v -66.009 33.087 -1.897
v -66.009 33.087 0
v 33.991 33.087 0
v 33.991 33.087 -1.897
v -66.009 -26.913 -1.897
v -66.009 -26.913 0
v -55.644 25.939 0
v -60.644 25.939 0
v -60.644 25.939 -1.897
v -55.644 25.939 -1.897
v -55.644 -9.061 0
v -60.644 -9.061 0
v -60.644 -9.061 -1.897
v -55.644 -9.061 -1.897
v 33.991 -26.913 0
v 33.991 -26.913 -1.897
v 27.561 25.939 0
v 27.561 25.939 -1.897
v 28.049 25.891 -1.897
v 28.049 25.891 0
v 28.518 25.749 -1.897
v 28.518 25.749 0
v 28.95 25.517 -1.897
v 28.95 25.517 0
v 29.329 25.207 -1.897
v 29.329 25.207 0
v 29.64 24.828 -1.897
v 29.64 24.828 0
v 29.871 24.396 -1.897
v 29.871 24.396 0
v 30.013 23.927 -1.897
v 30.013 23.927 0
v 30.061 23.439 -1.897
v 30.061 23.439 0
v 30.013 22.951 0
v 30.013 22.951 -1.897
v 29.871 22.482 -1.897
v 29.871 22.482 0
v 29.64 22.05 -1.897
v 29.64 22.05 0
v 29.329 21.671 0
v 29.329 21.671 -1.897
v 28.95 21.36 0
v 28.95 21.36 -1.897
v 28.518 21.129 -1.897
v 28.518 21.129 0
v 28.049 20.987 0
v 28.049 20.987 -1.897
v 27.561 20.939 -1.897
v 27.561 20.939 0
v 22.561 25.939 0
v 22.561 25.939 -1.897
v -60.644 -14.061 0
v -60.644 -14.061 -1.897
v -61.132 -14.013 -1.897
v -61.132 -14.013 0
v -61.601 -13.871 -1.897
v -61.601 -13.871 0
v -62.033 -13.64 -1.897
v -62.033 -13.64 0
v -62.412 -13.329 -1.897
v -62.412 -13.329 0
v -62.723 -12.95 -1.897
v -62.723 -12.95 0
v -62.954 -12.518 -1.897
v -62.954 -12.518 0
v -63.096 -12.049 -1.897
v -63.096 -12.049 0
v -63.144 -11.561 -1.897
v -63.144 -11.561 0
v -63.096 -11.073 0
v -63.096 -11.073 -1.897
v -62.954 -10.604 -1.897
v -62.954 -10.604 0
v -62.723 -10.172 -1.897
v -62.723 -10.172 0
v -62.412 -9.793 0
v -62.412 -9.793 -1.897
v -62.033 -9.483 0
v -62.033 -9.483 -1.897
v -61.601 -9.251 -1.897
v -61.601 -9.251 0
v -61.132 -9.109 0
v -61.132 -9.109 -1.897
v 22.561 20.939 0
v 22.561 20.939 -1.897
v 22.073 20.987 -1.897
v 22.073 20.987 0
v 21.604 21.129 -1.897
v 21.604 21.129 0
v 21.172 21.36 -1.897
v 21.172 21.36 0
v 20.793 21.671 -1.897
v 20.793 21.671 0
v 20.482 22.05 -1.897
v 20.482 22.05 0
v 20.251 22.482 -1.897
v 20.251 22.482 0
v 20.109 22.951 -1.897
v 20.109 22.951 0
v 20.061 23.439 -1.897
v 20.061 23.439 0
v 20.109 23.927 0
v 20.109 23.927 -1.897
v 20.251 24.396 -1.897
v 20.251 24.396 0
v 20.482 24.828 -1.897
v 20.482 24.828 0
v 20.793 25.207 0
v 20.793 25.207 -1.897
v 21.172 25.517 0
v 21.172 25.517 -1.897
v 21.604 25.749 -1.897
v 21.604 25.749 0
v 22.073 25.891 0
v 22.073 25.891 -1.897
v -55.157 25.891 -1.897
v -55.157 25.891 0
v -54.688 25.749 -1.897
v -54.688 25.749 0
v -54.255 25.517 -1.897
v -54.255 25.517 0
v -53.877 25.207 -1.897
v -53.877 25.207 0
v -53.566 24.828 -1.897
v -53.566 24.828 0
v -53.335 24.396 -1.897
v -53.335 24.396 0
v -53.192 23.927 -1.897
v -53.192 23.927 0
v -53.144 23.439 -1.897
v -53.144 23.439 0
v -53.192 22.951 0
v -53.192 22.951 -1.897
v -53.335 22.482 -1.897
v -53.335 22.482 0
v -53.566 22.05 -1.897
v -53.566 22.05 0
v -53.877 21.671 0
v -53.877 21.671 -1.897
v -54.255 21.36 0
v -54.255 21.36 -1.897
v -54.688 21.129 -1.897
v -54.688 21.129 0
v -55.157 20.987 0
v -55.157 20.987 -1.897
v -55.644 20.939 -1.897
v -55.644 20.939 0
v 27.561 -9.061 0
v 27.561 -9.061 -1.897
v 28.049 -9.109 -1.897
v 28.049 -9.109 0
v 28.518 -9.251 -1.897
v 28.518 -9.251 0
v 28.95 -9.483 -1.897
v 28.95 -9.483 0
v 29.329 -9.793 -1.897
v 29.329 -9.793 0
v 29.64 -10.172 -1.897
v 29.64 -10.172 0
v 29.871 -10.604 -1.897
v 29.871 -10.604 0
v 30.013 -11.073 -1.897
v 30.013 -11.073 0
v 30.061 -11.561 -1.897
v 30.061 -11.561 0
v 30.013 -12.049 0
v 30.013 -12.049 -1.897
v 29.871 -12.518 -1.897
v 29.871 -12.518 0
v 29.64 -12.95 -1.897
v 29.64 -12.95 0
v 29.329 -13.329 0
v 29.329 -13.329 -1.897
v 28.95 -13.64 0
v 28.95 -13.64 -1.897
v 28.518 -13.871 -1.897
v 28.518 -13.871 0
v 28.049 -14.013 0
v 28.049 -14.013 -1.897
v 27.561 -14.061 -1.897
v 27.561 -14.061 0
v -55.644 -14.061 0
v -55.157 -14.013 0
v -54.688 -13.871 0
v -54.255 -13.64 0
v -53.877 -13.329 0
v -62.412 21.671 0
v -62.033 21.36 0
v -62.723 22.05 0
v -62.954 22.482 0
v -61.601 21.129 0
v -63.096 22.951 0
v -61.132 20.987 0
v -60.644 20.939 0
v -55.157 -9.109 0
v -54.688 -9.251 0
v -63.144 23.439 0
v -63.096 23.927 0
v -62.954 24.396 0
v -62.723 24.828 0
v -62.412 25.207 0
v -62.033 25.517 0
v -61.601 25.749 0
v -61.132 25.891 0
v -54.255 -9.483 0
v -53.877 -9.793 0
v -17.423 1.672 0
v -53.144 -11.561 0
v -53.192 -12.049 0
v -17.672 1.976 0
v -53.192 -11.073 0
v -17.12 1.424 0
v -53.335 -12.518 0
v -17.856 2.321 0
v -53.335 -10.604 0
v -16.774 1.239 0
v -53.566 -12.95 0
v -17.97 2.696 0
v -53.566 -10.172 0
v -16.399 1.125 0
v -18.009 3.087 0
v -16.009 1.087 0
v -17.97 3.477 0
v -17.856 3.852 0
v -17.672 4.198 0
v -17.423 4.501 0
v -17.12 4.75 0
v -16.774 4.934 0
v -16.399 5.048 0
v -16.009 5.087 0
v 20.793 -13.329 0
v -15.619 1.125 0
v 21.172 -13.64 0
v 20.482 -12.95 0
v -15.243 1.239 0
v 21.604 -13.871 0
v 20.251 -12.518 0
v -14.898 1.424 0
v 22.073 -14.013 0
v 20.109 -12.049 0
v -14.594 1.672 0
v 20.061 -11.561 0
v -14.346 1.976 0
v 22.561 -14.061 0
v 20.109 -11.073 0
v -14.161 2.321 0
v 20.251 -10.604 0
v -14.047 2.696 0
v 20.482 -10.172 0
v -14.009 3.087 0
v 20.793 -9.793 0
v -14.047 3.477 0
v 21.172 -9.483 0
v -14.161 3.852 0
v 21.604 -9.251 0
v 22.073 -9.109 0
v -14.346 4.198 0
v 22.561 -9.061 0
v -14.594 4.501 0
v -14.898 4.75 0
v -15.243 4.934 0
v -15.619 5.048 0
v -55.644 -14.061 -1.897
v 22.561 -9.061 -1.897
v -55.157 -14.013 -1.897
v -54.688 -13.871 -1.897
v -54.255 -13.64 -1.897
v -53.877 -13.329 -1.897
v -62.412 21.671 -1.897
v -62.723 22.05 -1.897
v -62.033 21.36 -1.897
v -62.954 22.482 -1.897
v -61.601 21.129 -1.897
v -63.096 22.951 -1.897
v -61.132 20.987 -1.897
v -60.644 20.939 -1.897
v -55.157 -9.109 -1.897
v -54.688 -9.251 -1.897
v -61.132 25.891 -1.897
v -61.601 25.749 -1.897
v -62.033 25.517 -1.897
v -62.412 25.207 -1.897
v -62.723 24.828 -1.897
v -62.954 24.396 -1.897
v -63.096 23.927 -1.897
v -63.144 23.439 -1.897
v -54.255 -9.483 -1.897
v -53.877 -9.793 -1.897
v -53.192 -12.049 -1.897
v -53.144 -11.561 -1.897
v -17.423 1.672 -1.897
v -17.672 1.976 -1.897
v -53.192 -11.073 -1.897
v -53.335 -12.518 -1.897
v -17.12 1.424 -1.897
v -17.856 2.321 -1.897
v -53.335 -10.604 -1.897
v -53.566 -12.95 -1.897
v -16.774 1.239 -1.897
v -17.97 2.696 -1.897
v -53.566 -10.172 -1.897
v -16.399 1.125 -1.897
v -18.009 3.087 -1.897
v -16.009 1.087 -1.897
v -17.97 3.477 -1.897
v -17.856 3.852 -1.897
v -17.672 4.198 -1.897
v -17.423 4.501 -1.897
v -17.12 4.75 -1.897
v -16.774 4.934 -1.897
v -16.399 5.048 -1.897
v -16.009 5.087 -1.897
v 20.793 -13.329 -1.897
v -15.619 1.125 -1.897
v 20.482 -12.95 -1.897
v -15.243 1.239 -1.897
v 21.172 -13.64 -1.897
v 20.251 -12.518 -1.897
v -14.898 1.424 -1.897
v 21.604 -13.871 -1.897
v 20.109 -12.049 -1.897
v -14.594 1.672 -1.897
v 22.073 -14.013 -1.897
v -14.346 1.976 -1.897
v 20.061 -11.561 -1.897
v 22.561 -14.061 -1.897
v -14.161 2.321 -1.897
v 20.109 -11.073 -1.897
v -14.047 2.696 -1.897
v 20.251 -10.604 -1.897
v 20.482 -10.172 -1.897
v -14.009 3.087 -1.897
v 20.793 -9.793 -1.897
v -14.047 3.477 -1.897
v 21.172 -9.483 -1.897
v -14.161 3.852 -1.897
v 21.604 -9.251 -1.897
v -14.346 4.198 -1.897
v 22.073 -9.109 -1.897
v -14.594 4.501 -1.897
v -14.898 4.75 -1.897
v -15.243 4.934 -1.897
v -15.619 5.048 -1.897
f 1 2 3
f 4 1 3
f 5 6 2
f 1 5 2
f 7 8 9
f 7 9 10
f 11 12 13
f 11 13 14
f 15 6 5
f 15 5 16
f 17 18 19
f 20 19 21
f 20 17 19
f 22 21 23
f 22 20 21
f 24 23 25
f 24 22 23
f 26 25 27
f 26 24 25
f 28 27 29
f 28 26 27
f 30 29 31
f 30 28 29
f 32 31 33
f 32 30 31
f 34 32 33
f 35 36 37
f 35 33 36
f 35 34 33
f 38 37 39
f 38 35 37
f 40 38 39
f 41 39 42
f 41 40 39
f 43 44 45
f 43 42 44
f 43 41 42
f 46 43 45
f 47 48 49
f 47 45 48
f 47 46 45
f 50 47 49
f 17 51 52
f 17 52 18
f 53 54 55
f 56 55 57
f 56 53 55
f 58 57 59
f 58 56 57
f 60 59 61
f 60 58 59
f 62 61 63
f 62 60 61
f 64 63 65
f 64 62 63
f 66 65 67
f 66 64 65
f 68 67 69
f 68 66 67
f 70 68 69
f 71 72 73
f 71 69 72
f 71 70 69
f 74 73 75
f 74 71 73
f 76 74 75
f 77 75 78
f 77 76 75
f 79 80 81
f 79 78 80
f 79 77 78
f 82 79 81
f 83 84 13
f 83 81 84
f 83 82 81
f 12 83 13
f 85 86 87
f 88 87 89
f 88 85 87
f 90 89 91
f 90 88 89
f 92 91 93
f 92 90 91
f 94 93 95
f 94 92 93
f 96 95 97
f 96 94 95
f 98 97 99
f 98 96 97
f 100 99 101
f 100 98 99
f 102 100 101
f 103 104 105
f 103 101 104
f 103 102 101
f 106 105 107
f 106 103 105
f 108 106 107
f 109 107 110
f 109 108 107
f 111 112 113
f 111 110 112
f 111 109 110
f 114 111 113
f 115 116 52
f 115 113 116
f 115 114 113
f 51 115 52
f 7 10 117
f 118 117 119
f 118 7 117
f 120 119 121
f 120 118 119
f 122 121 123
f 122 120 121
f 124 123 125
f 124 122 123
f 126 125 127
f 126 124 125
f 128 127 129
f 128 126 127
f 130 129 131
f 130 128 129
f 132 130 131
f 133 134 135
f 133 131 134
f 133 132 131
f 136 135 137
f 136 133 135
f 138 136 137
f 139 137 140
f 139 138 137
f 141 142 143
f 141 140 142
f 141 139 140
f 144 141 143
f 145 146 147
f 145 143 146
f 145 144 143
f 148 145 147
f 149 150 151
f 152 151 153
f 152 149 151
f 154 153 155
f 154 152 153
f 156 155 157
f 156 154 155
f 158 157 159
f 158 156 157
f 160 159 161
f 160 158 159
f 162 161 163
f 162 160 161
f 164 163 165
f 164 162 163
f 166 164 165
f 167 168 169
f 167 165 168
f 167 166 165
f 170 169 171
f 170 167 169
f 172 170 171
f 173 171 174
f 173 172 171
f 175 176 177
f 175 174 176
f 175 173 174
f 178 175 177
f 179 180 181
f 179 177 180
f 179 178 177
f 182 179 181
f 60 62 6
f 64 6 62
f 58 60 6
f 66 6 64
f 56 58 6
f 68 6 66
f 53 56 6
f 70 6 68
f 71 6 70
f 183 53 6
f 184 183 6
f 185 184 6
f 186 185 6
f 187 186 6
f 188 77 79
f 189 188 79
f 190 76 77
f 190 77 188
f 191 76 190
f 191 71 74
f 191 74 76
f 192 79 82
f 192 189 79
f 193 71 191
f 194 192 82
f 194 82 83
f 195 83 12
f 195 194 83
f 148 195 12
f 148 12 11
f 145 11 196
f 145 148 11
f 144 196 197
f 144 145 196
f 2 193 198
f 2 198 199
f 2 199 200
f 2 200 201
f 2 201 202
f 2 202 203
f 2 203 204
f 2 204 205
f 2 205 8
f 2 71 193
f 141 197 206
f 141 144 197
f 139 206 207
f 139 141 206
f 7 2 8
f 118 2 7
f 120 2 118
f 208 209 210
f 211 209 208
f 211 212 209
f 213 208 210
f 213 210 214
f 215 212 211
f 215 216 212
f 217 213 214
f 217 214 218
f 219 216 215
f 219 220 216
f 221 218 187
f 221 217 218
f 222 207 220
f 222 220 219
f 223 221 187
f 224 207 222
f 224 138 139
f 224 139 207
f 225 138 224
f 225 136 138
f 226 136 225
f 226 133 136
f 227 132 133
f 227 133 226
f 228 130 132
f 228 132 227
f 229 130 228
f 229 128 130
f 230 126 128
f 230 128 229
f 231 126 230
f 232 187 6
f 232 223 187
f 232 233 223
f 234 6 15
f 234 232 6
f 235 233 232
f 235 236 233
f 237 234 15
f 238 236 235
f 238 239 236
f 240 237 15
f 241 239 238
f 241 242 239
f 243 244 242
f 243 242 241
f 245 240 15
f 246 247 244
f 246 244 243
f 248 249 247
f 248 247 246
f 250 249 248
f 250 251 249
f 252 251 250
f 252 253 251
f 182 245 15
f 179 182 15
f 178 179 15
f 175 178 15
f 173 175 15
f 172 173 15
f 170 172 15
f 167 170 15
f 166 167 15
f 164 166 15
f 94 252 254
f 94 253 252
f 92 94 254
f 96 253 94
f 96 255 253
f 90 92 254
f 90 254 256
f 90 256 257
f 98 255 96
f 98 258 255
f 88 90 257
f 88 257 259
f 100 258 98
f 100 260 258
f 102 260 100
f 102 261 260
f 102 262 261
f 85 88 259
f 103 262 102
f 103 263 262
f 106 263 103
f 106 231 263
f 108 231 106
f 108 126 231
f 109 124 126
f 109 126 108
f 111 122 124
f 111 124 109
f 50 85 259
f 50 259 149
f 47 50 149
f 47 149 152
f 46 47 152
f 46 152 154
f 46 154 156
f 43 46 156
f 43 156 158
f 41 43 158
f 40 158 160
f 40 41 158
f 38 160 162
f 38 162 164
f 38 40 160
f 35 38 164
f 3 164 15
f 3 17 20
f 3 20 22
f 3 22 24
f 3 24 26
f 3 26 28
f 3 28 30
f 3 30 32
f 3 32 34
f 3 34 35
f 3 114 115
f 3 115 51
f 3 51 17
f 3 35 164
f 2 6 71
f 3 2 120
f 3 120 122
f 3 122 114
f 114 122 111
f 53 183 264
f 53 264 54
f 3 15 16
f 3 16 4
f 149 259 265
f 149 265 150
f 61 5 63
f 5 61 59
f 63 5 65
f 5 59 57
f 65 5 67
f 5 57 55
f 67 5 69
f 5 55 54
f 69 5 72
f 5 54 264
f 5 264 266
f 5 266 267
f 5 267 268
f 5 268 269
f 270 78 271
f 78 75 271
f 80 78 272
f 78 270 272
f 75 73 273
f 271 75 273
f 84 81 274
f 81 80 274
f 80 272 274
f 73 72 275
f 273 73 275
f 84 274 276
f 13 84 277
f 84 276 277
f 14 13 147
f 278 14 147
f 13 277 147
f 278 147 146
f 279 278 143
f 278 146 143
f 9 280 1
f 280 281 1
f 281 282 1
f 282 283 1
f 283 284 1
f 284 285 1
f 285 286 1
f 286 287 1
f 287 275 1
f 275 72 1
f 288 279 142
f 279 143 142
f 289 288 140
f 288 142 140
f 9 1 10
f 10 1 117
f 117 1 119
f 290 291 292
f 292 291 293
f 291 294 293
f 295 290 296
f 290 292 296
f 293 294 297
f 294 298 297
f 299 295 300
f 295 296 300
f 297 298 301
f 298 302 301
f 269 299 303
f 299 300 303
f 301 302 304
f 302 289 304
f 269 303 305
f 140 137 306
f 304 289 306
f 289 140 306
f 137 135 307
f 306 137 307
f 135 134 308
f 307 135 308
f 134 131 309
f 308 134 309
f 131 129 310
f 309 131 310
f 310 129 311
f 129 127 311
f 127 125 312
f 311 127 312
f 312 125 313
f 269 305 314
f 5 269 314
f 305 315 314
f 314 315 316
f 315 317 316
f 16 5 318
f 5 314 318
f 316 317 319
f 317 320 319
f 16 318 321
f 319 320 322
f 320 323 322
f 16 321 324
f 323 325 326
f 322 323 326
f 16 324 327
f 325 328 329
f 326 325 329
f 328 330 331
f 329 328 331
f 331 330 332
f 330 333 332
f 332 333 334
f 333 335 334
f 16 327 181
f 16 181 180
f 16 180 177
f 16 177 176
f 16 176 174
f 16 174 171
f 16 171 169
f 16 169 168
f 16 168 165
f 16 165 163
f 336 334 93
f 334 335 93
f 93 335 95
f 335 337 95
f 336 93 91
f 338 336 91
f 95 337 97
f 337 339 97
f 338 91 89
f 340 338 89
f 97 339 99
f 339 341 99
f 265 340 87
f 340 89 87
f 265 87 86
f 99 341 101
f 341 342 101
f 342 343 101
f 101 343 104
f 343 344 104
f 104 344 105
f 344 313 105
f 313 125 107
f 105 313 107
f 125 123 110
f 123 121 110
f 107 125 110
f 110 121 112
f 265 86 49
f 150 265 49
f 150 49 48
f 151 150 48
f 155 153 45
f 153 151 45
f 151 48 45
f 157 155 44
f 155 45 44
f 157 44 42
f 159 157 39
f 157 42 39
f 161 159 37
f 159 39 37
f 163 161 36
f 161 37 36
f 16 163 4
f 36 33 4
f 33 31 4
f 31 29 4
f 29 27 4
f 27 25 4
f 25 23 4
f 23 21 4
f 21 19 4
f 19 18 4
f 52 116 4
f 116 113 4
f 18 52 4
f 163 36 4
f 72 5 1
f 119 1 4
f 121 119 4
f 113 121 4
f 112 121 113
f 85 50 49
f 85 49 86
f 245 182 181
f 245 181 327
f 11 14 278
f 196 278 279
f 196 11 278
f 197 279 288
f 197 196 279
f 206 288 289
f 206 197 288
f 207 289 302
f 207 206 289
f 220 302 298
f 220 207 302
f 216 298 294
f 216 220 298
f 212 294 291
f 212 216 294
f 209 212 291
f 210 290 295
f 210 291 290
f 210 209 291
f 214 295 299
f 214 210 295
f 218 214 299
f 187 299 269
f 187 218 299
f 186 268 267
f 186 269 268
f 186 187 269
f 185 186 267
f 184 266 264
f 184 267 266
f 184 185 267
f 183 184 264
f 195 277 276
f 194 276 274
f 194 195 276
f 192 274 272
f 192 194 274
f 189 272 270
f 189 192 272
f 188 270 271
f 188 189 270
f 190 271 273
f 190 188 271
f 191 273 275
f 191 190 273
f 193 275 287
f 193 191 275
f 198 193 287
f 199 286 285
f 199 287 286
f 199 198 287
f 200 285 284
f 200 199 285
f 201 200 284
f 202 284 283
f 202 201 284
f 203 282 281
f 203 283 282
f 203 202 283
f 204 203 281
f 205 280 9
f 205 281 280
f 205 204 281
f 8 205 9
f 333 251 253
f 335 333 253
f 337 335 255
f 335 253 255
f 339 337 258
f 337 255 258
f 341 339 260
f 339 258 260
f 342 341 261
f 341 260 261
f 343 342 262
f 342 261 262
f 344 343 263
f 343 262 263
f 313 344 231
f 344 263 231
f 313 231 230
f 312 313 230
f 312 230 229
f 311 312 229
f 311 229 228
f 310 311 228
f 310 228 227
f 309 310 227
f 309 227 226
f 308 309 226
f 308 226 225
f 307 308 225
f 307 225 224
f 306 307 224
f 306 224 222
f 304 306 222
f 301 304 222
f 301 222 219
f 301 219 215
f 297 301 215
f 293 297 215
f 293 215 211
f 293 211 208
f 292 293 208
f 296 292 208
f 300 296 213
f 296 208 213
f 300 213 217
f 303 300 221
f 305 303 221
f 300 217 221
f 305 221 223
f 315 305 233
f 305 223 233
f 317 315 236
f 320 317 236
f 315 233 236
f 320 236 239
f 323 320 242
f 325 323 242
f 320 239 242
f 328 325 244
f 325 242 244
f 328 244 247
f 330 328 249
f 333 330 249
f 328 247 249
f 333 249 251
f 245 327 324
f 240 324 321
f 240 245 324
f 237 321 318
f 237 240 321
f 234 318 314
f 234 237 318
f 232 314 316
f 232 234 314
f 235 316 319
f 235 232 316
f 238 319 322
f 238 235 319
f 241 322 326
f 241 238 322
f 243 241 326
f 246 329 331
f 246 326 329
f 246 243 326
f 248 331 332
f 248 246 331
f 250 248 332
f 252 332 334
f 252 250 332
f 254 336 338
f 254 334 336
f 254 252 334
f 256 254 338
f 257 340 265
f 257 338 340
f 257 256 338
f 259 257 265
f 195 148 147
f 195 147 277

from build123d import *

# Parameters (mm, degrees)
SKETCH1_W          = 100
SKETCH1_H          = 60
BASE_FLANGE1_DEPTH = 1.89738
SKETCH7_R          = 2
CUT_EXTRUDE2_DEPTH = 2


# Sheet-metal steps are written as plain solids
with BuildPart() as part:
    # Sketch1 → Base-Flange1 (new body)
    with BuildSketch(Plane.XY):
        with Locations((-16.008698092, 3.086666862)):
            Rectangle(SKETCH1_W, SKETCH1_H)
    extrude(amount=-BASE_FLANGE1_DEPTH)

    # Sketch7 → Cut-Extrude2 (cut)
    with BuildSketch(Plane.XY):
        with Locations((-16.008698092, 3.086666862)):
            Circle(SKETCH7_R)
        with BuildLine():
            Line((-60.644357263, -9.061184979), (-55.644357263, -9.061184979))
            ThreePointArc((-55.644357263, -9.061184979), (-53.144357263, -11.561184979), (-55.644357263, -14.061184979))
            Line((-55.644357263, -14.061184979), (-60.644357263, -14.061184979))
            ThreePointArc((-60.644357263, -14.061184979), (-63.144357263, -11.561184979), (-60.644357263, -9.061184979))
        make_face()
        with BuildLine():
            Line((-60.644357263, 25.938815021), (-55.644357263, 25.938815021))
            ThreePointArc((-55.644357263, 25.938815021), (-53.144357263, 23.438815021), (-55.644357263, 20.938815021))
            Line((-55.644357263, 20.938815021), (-60.644357263, 20.938815021))
            ThreePointArc((-60.644357263, 20.938815021), (-63.144357263, 23.438815021), (-60.644357263, 25.938815021))
        make_face()
        with BuildLine():
            Line((27.560882737, 20.938815021), (22.560882737, 20.938815021))
            ThreePointArc((22.560882737, 20.938815021), (20.060882737, 23.438815021), (22.560882737, 25.938815021))
            Line((22.560882737, 25.938815021), (27.560882737, 25.938815021))
            ThreePointArc((27.560882737, 25.938815021), (30.060882737, 23.438815021), (27.560882737, 20.938815021))
        make_face()
        with BuildLine():
            Line((27.560882737, -14.061184979), (22.560882737, -14.061184979))
            ThreePointArc((22.560882737, -14.061184979), (20.060882737, -11.561184979), (22.560882737, -9.061184979))
            Line((22.560882737, -9.061184979), (27.560882737, -9.061184979))
            ThreePointArc((27.560882737, -9.061184979), (30.060882737, -11.561184979), (27.560882737, -14.061184979))
        make_face()
    extrude(amount=-CUT_EXTRUDE2_DEPTH, mode=Mode.SUBTRACT)


solid = part.part
